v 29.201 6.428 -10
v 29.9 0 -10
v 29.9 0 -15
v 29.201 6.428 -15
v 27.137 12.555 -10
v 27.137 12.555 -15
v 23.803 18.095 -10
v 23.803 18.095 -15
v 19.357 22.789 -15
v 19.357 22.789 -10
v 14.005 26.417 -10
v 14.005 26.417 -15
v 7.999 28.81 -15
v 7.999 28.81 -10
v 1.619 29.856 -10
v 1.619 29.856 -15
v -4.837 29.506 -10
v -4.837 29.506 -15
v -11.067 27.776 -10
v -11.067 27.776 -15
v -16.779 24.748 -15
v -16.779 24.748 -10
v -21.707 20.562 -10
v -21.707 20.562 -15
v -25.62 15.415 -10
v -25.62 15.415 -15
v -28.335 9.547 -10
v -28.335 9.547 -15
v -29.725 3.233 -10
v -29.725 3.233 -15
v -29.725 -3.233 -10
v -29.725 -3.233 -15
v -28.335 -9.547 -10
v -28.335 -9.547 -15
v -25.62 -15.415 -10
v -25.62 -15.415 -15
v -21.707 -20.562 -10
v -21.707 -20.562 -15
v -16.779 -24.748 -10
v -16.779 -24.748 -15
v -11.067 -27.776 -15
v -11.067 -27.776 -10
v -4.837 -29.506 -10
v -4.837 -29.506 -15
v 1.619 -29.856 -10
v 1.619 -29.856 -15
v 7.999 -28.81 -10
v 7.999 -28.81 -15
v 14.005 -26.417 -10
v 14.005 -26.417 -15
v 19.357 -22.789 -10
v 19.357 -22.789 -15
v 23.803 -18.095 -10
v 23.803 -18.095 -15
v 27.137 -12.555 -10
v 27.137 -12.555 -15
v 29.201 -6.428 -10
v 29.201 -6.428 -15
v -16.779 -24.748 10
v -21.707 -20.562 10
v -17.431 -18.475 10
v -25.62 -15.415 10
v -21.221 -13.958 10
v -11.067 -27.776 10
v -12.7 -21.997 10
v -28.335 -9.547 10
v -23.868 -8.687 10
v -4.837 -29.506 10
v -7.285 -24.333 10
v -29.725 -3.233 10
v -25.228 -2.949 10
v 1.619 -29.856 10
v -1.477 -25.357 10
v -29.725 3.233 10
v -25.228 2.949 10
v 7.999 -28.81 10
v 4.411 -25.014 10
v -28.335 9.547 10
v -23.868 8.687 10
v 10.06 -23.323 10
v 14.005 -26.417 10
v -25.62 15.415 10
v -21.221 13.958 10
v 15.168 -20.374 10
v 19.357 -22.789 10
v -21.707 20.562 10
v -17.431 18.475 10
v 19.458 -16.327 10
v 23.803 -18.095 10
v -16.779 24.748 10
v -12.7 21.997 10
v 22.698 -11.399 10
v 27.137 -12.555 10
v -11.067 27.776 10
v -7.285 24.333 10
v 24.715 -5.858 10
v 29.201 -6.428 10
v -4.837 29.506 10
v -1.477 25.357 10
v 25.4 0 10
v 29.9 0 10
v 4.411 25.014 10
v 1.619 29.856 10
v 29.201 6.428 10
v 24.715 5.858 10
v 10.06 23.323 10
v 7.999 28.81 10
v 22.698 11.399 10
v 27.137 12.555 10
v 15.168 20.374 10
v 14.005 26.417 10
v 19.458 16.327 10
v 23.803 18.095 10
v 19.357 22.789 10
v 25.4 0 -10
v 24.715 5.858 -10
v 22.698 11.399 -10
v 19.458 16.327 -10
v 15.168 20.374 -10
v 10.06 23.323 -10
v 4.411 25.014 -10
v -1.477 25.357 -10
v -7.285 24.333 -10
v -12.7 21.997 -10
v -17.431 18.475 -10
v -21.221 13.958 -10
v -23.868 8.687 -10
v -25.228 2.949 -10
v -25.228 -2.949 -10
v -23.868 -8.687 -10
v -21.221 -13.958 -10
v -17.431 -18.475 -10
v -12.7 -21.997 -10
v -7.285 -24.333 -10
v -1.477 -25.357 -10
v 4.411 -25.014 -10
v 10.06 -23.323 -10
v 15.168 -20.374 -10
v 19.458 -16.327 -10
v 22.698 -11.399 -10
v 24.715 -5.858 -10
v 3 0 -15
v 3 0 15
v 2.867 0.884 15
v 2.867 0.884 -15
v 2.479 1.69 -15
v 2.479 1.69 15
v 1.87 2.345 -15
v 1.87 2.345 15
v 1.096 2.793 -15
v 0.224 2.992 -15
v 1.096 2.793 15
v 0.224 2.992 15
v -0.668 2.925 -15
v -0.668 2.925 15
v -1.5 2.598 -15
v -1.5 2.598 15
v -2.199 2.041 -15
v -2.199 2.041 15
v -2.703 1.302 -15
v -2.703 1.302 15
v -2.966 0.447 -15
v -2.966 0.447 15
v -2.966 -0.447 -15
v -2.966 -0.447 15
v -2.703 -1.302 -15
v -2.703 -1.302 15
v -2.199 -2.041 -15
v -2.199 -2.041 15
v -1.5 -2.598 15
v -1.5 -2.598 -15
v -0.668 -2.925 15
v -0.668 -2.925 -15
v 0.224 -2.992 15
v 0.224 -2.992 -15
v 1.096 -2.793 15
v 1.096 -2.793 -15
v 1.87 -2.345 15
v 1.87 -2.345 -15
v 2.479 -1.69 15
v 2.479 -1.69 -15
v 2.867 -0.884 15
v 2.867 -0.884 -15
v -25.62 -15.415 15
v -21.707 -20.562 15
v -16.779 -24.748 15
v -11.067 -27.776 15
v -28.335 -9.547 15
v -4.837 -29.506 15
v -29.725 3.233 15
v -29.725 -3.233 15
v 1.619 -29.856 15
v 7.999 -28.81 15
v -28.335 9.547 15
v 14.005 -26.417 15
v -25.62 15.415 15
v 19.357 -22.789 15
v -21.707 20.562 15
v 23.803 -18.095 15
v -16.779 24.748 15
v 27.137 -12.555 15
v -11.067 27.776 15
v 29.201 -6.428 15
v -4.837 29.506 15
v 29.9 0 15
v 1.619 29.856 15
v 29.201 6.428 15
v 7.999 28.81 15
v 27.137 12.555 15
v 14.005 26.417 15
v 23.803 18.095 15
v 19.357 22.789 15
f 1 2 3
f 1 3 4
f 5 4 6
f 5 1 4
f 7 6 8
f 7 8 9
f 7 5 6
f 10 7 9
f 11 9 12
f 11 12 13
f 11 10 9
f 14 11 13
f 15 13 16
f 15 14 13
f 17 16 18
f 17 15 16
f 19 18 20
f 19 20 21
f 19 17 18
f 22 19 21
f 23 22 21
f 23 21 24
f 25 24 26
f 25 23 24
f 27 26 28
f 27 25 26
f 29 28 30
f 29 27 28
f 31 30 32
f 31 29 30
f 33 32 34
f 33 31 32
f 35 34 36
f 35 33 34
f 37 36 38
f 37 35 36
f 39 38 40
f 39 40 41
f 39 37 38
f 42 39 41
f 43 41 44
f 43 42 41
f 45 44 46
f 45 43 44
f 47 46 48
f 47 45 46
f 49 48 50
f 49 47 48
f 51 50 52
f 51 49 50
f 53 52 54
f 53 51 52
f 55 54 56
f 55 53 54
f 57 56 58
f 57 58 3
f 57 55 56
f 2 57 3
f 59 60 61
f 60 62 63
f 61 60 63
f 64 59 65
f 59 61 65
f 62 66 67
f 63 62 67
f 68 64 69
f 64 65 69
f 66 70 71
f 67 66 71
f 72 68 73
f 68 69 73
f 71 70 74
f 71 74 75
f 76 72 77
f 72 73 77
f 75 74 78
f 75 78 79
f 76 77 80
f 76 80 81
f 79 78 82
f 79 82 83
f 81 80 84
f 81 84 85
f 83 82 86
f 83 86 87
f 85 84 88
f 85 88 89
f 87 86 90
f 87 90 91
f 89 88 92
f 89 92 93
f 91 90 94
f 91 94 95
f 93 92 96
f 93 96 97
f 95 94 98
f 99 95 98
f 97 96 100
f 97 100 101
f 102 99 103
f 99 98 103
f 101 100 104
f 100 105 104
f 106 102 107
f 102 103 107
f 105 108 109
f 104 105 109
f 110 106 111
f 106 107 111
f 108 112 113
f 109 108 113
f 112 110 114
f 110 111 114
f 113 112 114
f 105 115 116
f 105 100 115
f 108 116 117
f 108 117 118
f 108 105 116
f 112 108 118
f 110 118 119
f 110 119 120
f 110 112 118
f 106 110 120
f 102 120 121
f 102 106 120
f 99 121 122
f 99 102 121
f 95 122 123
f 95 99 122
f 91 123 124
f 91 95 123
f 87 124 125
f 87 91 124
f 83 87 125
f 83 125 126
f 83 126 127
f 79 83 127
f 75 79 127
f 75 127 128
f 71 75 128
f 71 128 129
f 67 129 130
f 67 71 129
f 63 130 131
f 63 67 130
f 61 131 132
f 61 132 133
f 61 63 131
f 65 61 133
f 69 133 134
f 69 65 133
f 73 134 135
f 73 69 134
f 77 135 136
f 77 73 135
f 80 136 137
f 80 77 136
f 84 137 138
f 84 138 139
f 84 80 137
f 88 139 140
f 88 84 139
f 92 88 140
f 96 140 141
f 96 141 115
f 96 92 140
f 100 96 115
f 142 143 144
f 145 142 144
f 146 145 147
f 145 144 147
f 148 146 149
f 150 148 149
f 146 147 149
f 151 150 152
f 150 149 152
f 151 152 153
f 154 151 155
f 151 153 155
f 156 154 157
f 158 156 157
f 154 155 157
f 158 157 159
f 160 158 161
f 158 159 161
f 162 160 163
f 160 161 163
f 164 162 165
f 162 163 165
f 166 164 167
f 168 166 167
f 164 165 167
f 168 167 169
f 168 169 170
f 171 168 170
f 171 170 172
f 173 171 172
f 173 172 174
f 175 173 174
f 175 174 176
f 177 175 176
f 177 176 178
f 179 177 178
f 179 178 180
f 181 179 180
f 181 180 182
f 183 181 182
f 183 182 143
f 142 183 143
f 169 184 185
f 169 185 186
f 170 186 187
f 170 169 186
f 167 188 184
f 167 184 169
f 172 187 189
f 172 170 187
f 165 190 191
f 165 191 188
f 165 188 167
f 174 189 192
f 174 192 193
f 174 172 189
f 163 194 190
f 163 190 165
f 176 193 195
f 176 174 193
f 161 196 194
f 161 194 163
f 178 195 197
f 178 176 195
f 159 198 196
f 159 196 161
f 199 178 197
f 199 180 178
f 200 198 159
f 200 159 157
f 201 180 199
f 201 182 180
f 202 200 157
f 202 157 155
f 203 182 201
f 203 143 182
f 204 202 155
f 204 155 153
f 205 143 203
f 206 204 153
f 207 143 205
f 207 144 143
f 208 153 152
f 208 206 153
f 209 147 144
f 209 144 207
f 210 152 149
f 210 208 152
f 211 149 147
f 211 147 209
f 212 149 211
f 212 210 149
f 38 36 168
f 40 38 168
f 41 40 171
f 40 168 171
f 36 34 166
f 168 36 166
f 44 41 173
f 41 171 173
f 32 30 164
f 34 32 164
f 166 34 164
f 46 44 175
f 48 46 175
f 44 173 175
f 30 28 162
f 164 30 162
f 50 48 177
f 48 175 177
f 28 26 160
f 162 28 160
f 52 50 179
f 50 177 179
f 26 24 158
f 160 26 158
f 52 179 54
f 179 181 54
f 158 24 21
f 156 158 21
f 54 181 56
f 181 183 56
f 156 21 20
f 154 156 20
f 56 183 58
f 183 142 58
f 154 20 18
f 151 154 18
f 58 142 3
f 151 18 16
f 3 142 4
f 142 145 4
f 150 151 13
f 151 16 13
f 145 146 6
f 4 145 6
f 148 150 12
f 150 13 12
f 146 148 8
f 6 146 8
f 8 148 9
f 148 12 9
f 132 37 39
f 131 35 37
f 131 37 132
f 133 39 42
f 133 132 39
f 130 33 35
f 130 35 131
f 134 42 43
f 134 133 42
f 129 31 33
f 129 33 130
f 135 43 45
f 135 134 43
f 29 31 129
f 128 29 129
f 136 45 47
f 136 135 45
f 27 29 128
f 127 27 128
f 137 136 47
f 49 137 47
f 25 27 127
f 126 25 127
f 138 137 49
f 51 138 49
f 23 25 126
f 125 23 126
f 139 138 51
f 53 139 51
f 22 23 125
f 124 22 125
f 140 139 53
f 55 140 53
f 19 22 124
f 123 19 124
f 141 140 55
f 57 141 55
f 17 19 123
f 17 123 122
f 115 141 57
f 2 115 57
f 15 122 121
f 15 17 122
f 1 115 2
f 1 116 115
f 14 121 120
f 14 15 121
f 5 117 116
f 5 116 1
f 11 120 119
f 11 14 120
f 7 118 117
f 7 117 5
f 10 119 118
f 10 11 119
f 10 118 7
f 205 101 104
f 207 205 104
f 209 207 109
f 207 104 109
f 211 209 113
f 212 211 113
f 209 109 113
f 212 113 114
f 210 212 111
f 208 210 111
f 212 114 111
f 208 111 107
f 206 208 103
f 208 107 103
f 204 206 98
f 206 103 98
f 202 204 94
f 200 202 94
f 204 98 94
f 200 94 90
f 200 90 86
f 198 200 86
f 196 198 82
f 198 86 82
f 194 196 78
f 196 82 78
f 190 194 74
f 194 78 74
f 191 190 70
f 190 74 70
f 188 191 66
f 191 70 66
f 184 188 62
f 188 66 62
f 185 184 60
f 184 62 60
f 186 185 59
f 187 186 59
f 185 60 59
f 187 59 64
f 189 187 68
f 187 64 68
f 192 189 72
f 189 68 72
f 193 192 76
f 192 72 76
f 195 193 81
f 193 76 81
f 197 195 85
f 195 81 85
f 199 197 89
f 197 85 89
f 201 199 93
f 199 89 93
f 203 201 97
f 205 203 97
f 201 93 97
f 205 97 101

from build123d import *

# Parameters (mm, degrees)
SKETCH1_R           = 25.4
BOSS_EXTRUDE1_DEPTH = 10
SKETCH2_R           = 29.9
BOSS_EXTRUDE2_DEPTH = 5
SKETCH3_R           = 3
CUT_EXTRUDE1_DEPTH  = 76.628


with BuildPart() as part:
    # Sketch1 → Boss-Extrude1 (new body, symmetric)
    with BuildSketch(Plane.XY):
        Circle(SKETCH1_R)
    extrude(amount=BOSS_EXTRUDE1_DEPTH, both=True)

    # Sketch2 → Boss-Extrude2 (add)
    with BuildSketch(Plane.XY.offset(10)):
        Circle(SKETCH2_R)
    boss_extrude2 = extrude(amount=BOSS_EXTRUDE2_DEPTH)

    # Mirror1: Boss-Extrude2 across plane
    add(boss_extrude2.mirror(Plane.XY))

    # Sketch3 → Cut-Extrude1 (cut)
    with BuildSketch(Plane.XY.offset(15)):
        Circle(SKETCH3_R)
    extrude(amount=-CUT_EXTRUDE1_DEPTH, mode=Mode.SUBTRACT)


solid = part.part
